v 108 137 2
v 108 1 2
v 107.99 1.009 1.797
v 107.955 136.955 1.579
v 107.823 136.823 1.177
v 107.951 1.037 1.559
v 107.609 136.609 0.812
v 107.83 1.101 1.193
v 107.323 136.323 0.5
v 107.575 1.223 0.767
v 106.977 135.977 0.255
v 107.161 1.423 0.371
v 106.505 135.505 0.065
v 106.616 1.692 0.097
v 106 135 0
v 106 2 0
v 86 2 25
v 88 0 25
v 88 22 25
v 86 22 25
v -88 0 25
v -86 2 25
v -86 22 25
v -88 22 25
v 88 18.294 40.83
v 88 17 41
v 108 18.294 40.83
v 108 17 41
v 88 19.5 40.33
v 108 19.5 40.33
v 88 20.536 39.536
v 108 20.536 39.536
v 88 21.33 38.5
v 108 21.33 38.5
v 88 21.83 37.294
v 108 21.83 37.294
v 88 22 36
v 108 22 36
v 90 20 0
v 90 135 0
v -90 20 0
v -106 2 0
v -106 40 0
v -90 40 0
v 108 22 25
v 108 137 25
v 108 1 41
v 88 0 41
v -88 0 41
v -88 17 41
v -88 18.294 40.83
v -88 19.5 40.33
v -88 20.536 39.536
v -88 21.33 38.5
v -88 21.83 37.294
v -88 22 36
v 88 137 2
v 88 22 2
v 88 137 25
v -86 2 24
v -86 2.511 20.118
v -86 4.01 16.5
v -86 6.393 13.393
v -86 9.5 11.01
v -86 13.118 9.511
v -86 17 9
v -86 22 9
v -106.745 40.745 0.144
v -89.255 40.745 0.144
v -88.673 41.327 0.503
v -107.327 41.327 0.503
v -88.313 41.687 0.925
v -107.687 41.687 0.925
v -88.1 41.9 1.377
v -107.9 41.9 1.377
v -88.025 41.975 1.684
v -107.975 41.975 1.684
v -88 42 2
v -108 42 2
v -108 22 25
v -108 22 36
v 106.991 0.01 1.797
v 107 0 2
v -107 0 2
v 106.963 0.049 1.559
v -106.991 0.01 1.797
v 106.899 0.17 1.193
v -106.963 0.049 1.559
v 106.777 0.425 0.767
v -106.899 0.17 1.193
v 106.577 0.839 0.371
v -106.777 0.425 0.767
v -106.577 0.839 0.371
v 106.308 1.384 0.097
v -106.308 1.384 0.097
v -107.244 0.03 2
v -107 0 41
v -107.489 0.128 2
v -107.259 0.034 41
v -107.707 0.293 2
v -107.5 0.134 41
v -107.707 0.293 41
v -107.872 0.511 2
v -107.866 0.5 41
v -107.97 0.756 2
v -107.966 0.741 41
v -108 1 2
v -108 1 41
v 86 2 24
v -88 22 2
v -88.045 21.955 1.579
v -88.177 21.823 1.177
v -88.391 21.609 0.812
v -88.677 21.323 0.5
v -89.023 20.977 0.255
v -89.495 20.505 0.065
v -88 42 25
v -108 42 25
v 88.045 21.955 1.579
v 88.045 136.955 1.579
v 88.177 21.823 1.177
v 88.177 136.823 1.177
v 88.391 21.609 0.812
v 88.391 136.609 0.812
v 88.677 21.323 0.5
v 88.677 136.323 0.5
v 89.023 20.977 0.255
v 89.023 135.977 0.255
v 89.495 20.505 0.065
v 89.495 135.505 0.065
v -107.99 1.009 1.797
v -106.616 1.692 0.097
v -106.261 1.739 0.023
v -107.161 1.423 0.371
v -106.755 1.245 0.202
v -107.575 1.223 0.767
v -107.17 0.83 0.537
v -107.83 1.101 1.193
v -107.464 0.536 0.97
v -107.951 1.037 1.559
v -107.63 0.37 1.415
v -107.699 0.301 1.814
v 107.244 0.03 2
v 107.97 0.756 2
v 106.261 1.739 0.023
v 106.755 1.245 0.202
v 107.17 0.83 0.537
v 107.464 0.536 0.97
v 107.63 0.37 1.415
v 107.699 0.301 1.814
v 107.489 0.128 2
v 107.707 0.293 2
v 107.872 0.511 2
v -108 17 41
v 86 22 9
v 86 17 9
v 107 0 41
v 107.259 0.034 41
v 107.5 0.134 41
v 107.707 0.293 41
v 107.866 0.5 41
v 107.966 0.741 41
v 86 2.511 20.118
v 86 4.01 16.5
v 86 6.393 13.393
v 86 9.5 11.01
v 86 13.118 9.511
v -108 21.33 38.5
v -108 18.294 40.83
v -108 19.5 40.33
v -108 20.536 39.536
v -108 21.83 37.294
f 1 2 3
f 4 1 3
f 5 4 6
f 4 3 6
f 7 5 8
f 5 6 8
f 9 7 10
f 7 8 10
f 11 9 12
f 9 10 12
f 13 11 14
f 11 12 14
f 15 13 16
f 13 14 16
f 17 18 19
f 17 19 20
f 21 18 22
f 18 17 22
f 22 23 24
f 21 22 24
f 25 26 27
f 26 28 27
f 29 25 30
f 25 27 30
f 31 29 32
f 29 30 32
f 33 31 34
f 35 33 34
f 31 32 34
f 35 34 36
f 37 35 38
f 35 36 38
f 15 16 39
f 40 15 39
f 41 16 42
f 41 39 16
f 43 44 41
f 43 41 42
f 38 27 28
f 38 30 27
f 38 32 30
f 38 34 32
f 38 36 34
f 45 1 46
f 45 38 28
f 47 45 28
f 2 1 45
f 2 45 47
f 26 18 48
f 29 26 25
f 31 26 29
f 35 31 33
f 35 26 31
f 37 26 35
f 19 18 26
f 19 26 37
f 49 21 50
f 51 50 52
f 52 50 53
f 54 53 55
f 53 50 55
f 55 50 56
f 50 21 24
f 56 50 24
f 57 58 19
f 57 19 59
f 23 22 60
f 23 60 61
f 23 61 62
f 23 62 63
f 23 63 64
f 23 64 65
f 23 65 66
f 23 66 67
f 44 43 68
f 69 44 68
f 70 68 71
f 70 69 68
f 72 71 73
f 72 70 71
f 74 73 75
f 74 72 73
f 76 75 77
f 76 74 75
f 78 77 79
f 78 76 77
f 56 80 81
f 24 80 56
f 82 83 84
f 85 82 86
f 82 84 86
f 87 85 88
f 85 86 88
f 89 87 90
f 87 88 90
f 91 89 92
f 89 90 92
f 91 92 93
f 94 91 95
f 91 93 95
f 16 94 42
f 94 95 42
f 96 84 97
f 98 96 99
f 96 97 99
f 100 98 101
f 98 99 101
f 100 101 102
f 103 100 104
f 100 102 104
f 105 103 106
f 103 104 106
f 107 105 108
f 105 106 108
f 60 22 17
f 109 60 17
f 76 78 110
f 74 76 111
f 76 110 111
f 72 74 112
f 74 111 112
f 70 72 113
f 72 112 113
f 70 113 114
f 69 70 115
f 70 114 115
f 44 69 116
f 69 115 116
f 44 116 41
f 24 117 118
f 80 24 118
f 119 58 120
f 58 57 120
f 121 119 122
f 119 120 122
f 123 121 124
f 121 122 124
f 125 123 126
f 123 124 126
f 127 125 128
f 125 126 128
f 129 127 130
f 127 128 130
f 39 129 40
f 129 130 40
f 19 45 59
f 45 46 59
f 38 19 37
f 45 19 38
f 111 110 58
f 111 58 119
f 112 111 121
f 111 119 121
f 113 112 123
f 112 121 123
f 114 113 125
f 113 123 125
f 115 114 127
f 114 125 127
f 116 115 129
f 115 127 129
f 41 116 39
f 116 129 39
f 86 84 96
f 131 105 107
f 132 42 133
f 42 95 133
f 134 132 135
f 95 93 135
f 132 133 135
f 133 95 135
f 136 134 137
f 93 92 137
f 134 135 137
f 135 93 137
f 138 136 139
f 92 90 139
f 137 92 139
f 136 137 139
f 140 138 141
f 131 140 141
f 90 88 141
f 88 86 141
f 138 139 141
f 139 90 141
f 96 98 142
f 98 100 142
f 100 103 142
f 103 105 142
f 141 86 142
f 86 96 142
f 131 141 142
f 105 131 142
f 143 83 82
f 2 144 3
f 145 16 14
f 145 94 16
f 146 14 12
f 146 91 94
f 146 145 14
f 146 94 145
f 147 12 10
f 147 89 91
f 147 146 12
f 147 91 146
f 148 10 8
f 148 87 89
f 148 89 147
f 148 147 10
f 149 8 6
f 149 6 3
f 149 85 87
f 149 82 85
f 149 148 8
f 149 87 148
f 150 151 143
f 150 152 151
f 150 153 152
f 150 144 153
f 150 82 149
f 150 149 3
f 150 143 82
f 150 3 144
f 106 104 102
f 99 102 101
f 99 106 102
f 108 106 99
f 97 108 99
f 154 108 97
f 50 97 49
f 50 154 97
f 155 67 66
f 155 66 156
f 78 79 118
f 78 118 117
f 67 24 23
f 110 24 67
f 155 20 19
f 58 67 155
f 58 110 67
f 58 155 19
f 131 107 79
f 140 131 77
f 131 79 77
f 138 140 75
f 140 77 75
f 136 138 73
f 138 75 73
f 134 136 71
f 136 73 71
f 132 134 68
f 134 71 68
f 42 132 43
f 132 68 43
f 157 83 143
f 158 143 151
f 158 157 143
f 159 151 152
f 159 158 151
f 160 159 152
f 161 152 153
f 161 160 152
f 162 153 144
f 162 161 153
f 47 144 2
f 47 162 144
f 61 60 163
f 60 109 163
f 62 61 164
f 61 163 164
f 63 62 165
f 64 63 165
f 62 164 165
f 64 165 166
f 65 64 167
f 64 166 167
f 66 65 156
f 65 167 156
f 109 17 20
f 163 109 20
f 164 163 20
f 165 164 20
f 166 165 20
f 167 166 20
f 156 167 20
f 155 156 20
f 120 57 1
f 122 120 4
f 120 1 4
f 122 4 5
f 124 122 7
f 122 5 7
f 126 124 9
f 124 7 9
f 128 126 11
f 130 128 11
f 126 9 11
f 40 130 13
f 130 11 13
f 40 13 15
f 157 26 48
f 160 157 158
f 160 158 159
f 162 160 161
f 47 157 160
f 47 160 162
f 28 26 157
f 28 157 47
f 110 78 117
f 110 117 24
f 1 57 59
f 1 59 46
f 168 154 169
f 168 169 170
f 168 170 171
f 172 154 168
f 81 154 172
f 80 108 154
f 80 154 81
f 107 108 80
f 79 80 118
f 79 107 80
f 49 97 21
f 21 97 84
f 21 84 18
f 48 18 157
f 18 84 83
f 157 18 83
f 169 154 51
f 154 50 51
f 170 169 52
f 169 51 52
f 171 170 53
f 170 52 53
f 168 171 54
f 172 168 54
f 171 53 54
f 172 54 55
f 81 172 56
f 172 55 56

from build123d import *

# Parameters (mm, degrees)
PAD004_DEPTH    = 25
SKETCH007_W     = 20
SKETCH007_H     = 22
PAD005_DEPTH    = 16
FILLET003_R     = 2
SKETCH010_W     = 172
SKETCH010_H     = 20
POCKET003_DEPTH = 16
FILLET007_R     = 15
FILLET008_R     = 5
FILLET009_R     = 1


with BuildPart() as part:
    # Sketch006 → Pad004 (new body)
    with BuildSketch(Plane.XY):
        Polygon((-108, 42), (-88, 42), (-88, 22), (88, 22), (88, 137), (108, 137), (108, 0), (-108, 0), align=None)
    extrude(amount=PAD004_DEPTH)

    # Sketch007 (on DatumPlane) → Pad005 (join)
    with BuildSketch(Plane.XY.offset(25)):
        with Locations((-98, 11)):
            Rectangle(SKETCH007_W, SKETCH007_H)
        with Locations((98, 11)):
            Rectangle(SKETCH007_W, SKETCH007_H)
    extrude(amount=PAD005_DEPTH)

    # Fillet003
    fillet003_edges = [part.edges().sort_by_distance(p)[0] for p in [
        (-98, 42, 0),
        (-88, 32, 0),
        (0, 22, 0),
        (88, 79.5, 0),
        (98, 137, 0),
        (108, 68.5, 0),
        (0, 0, 0),
        (-108, 21, 0),
    ]]
    fillet(fillet003_edges, radius=FILLET003_R)

    # Sketch010 (on DatumPlane) → Pocket003 (cut)
    with BuildSketch(Plane.XY.offset(25)):
        with Locations((0, 12)):
            Rectangle(SKETCH010_W, SKETCH010_H)
    extrude(amount=-POCKET003_DEPTH, mode=Mode.SUBTRACT)

    # Fillet007
    fillet007_edges = [part.edges().sort_by_distance(p)[0] for p in [
        (0, 2, 9),
    ]]
    fillet(fillet007_edges, radius=FILLET007_R)

    # Fillet008
    fillet008_edges = [part.edges().sort_by_distance(p)[0] for p in [
        (-98, 22, 41),
        (98, 22, 41),
    ]]
    fillet(fillet008_edges, radius=FILLET008_R)

    # Fillet009
    fillet009_edges = [part.edges().sort_by_distance(p)[0] for p in [
        (108, 0, 33),
        (108, 0, 13.5),
        (-108, 0, 33),
        (-108, 0, 13.5),
    ]]
    fillet(fillet009_edges, radius=FILLET009_R)


solid = part.part
